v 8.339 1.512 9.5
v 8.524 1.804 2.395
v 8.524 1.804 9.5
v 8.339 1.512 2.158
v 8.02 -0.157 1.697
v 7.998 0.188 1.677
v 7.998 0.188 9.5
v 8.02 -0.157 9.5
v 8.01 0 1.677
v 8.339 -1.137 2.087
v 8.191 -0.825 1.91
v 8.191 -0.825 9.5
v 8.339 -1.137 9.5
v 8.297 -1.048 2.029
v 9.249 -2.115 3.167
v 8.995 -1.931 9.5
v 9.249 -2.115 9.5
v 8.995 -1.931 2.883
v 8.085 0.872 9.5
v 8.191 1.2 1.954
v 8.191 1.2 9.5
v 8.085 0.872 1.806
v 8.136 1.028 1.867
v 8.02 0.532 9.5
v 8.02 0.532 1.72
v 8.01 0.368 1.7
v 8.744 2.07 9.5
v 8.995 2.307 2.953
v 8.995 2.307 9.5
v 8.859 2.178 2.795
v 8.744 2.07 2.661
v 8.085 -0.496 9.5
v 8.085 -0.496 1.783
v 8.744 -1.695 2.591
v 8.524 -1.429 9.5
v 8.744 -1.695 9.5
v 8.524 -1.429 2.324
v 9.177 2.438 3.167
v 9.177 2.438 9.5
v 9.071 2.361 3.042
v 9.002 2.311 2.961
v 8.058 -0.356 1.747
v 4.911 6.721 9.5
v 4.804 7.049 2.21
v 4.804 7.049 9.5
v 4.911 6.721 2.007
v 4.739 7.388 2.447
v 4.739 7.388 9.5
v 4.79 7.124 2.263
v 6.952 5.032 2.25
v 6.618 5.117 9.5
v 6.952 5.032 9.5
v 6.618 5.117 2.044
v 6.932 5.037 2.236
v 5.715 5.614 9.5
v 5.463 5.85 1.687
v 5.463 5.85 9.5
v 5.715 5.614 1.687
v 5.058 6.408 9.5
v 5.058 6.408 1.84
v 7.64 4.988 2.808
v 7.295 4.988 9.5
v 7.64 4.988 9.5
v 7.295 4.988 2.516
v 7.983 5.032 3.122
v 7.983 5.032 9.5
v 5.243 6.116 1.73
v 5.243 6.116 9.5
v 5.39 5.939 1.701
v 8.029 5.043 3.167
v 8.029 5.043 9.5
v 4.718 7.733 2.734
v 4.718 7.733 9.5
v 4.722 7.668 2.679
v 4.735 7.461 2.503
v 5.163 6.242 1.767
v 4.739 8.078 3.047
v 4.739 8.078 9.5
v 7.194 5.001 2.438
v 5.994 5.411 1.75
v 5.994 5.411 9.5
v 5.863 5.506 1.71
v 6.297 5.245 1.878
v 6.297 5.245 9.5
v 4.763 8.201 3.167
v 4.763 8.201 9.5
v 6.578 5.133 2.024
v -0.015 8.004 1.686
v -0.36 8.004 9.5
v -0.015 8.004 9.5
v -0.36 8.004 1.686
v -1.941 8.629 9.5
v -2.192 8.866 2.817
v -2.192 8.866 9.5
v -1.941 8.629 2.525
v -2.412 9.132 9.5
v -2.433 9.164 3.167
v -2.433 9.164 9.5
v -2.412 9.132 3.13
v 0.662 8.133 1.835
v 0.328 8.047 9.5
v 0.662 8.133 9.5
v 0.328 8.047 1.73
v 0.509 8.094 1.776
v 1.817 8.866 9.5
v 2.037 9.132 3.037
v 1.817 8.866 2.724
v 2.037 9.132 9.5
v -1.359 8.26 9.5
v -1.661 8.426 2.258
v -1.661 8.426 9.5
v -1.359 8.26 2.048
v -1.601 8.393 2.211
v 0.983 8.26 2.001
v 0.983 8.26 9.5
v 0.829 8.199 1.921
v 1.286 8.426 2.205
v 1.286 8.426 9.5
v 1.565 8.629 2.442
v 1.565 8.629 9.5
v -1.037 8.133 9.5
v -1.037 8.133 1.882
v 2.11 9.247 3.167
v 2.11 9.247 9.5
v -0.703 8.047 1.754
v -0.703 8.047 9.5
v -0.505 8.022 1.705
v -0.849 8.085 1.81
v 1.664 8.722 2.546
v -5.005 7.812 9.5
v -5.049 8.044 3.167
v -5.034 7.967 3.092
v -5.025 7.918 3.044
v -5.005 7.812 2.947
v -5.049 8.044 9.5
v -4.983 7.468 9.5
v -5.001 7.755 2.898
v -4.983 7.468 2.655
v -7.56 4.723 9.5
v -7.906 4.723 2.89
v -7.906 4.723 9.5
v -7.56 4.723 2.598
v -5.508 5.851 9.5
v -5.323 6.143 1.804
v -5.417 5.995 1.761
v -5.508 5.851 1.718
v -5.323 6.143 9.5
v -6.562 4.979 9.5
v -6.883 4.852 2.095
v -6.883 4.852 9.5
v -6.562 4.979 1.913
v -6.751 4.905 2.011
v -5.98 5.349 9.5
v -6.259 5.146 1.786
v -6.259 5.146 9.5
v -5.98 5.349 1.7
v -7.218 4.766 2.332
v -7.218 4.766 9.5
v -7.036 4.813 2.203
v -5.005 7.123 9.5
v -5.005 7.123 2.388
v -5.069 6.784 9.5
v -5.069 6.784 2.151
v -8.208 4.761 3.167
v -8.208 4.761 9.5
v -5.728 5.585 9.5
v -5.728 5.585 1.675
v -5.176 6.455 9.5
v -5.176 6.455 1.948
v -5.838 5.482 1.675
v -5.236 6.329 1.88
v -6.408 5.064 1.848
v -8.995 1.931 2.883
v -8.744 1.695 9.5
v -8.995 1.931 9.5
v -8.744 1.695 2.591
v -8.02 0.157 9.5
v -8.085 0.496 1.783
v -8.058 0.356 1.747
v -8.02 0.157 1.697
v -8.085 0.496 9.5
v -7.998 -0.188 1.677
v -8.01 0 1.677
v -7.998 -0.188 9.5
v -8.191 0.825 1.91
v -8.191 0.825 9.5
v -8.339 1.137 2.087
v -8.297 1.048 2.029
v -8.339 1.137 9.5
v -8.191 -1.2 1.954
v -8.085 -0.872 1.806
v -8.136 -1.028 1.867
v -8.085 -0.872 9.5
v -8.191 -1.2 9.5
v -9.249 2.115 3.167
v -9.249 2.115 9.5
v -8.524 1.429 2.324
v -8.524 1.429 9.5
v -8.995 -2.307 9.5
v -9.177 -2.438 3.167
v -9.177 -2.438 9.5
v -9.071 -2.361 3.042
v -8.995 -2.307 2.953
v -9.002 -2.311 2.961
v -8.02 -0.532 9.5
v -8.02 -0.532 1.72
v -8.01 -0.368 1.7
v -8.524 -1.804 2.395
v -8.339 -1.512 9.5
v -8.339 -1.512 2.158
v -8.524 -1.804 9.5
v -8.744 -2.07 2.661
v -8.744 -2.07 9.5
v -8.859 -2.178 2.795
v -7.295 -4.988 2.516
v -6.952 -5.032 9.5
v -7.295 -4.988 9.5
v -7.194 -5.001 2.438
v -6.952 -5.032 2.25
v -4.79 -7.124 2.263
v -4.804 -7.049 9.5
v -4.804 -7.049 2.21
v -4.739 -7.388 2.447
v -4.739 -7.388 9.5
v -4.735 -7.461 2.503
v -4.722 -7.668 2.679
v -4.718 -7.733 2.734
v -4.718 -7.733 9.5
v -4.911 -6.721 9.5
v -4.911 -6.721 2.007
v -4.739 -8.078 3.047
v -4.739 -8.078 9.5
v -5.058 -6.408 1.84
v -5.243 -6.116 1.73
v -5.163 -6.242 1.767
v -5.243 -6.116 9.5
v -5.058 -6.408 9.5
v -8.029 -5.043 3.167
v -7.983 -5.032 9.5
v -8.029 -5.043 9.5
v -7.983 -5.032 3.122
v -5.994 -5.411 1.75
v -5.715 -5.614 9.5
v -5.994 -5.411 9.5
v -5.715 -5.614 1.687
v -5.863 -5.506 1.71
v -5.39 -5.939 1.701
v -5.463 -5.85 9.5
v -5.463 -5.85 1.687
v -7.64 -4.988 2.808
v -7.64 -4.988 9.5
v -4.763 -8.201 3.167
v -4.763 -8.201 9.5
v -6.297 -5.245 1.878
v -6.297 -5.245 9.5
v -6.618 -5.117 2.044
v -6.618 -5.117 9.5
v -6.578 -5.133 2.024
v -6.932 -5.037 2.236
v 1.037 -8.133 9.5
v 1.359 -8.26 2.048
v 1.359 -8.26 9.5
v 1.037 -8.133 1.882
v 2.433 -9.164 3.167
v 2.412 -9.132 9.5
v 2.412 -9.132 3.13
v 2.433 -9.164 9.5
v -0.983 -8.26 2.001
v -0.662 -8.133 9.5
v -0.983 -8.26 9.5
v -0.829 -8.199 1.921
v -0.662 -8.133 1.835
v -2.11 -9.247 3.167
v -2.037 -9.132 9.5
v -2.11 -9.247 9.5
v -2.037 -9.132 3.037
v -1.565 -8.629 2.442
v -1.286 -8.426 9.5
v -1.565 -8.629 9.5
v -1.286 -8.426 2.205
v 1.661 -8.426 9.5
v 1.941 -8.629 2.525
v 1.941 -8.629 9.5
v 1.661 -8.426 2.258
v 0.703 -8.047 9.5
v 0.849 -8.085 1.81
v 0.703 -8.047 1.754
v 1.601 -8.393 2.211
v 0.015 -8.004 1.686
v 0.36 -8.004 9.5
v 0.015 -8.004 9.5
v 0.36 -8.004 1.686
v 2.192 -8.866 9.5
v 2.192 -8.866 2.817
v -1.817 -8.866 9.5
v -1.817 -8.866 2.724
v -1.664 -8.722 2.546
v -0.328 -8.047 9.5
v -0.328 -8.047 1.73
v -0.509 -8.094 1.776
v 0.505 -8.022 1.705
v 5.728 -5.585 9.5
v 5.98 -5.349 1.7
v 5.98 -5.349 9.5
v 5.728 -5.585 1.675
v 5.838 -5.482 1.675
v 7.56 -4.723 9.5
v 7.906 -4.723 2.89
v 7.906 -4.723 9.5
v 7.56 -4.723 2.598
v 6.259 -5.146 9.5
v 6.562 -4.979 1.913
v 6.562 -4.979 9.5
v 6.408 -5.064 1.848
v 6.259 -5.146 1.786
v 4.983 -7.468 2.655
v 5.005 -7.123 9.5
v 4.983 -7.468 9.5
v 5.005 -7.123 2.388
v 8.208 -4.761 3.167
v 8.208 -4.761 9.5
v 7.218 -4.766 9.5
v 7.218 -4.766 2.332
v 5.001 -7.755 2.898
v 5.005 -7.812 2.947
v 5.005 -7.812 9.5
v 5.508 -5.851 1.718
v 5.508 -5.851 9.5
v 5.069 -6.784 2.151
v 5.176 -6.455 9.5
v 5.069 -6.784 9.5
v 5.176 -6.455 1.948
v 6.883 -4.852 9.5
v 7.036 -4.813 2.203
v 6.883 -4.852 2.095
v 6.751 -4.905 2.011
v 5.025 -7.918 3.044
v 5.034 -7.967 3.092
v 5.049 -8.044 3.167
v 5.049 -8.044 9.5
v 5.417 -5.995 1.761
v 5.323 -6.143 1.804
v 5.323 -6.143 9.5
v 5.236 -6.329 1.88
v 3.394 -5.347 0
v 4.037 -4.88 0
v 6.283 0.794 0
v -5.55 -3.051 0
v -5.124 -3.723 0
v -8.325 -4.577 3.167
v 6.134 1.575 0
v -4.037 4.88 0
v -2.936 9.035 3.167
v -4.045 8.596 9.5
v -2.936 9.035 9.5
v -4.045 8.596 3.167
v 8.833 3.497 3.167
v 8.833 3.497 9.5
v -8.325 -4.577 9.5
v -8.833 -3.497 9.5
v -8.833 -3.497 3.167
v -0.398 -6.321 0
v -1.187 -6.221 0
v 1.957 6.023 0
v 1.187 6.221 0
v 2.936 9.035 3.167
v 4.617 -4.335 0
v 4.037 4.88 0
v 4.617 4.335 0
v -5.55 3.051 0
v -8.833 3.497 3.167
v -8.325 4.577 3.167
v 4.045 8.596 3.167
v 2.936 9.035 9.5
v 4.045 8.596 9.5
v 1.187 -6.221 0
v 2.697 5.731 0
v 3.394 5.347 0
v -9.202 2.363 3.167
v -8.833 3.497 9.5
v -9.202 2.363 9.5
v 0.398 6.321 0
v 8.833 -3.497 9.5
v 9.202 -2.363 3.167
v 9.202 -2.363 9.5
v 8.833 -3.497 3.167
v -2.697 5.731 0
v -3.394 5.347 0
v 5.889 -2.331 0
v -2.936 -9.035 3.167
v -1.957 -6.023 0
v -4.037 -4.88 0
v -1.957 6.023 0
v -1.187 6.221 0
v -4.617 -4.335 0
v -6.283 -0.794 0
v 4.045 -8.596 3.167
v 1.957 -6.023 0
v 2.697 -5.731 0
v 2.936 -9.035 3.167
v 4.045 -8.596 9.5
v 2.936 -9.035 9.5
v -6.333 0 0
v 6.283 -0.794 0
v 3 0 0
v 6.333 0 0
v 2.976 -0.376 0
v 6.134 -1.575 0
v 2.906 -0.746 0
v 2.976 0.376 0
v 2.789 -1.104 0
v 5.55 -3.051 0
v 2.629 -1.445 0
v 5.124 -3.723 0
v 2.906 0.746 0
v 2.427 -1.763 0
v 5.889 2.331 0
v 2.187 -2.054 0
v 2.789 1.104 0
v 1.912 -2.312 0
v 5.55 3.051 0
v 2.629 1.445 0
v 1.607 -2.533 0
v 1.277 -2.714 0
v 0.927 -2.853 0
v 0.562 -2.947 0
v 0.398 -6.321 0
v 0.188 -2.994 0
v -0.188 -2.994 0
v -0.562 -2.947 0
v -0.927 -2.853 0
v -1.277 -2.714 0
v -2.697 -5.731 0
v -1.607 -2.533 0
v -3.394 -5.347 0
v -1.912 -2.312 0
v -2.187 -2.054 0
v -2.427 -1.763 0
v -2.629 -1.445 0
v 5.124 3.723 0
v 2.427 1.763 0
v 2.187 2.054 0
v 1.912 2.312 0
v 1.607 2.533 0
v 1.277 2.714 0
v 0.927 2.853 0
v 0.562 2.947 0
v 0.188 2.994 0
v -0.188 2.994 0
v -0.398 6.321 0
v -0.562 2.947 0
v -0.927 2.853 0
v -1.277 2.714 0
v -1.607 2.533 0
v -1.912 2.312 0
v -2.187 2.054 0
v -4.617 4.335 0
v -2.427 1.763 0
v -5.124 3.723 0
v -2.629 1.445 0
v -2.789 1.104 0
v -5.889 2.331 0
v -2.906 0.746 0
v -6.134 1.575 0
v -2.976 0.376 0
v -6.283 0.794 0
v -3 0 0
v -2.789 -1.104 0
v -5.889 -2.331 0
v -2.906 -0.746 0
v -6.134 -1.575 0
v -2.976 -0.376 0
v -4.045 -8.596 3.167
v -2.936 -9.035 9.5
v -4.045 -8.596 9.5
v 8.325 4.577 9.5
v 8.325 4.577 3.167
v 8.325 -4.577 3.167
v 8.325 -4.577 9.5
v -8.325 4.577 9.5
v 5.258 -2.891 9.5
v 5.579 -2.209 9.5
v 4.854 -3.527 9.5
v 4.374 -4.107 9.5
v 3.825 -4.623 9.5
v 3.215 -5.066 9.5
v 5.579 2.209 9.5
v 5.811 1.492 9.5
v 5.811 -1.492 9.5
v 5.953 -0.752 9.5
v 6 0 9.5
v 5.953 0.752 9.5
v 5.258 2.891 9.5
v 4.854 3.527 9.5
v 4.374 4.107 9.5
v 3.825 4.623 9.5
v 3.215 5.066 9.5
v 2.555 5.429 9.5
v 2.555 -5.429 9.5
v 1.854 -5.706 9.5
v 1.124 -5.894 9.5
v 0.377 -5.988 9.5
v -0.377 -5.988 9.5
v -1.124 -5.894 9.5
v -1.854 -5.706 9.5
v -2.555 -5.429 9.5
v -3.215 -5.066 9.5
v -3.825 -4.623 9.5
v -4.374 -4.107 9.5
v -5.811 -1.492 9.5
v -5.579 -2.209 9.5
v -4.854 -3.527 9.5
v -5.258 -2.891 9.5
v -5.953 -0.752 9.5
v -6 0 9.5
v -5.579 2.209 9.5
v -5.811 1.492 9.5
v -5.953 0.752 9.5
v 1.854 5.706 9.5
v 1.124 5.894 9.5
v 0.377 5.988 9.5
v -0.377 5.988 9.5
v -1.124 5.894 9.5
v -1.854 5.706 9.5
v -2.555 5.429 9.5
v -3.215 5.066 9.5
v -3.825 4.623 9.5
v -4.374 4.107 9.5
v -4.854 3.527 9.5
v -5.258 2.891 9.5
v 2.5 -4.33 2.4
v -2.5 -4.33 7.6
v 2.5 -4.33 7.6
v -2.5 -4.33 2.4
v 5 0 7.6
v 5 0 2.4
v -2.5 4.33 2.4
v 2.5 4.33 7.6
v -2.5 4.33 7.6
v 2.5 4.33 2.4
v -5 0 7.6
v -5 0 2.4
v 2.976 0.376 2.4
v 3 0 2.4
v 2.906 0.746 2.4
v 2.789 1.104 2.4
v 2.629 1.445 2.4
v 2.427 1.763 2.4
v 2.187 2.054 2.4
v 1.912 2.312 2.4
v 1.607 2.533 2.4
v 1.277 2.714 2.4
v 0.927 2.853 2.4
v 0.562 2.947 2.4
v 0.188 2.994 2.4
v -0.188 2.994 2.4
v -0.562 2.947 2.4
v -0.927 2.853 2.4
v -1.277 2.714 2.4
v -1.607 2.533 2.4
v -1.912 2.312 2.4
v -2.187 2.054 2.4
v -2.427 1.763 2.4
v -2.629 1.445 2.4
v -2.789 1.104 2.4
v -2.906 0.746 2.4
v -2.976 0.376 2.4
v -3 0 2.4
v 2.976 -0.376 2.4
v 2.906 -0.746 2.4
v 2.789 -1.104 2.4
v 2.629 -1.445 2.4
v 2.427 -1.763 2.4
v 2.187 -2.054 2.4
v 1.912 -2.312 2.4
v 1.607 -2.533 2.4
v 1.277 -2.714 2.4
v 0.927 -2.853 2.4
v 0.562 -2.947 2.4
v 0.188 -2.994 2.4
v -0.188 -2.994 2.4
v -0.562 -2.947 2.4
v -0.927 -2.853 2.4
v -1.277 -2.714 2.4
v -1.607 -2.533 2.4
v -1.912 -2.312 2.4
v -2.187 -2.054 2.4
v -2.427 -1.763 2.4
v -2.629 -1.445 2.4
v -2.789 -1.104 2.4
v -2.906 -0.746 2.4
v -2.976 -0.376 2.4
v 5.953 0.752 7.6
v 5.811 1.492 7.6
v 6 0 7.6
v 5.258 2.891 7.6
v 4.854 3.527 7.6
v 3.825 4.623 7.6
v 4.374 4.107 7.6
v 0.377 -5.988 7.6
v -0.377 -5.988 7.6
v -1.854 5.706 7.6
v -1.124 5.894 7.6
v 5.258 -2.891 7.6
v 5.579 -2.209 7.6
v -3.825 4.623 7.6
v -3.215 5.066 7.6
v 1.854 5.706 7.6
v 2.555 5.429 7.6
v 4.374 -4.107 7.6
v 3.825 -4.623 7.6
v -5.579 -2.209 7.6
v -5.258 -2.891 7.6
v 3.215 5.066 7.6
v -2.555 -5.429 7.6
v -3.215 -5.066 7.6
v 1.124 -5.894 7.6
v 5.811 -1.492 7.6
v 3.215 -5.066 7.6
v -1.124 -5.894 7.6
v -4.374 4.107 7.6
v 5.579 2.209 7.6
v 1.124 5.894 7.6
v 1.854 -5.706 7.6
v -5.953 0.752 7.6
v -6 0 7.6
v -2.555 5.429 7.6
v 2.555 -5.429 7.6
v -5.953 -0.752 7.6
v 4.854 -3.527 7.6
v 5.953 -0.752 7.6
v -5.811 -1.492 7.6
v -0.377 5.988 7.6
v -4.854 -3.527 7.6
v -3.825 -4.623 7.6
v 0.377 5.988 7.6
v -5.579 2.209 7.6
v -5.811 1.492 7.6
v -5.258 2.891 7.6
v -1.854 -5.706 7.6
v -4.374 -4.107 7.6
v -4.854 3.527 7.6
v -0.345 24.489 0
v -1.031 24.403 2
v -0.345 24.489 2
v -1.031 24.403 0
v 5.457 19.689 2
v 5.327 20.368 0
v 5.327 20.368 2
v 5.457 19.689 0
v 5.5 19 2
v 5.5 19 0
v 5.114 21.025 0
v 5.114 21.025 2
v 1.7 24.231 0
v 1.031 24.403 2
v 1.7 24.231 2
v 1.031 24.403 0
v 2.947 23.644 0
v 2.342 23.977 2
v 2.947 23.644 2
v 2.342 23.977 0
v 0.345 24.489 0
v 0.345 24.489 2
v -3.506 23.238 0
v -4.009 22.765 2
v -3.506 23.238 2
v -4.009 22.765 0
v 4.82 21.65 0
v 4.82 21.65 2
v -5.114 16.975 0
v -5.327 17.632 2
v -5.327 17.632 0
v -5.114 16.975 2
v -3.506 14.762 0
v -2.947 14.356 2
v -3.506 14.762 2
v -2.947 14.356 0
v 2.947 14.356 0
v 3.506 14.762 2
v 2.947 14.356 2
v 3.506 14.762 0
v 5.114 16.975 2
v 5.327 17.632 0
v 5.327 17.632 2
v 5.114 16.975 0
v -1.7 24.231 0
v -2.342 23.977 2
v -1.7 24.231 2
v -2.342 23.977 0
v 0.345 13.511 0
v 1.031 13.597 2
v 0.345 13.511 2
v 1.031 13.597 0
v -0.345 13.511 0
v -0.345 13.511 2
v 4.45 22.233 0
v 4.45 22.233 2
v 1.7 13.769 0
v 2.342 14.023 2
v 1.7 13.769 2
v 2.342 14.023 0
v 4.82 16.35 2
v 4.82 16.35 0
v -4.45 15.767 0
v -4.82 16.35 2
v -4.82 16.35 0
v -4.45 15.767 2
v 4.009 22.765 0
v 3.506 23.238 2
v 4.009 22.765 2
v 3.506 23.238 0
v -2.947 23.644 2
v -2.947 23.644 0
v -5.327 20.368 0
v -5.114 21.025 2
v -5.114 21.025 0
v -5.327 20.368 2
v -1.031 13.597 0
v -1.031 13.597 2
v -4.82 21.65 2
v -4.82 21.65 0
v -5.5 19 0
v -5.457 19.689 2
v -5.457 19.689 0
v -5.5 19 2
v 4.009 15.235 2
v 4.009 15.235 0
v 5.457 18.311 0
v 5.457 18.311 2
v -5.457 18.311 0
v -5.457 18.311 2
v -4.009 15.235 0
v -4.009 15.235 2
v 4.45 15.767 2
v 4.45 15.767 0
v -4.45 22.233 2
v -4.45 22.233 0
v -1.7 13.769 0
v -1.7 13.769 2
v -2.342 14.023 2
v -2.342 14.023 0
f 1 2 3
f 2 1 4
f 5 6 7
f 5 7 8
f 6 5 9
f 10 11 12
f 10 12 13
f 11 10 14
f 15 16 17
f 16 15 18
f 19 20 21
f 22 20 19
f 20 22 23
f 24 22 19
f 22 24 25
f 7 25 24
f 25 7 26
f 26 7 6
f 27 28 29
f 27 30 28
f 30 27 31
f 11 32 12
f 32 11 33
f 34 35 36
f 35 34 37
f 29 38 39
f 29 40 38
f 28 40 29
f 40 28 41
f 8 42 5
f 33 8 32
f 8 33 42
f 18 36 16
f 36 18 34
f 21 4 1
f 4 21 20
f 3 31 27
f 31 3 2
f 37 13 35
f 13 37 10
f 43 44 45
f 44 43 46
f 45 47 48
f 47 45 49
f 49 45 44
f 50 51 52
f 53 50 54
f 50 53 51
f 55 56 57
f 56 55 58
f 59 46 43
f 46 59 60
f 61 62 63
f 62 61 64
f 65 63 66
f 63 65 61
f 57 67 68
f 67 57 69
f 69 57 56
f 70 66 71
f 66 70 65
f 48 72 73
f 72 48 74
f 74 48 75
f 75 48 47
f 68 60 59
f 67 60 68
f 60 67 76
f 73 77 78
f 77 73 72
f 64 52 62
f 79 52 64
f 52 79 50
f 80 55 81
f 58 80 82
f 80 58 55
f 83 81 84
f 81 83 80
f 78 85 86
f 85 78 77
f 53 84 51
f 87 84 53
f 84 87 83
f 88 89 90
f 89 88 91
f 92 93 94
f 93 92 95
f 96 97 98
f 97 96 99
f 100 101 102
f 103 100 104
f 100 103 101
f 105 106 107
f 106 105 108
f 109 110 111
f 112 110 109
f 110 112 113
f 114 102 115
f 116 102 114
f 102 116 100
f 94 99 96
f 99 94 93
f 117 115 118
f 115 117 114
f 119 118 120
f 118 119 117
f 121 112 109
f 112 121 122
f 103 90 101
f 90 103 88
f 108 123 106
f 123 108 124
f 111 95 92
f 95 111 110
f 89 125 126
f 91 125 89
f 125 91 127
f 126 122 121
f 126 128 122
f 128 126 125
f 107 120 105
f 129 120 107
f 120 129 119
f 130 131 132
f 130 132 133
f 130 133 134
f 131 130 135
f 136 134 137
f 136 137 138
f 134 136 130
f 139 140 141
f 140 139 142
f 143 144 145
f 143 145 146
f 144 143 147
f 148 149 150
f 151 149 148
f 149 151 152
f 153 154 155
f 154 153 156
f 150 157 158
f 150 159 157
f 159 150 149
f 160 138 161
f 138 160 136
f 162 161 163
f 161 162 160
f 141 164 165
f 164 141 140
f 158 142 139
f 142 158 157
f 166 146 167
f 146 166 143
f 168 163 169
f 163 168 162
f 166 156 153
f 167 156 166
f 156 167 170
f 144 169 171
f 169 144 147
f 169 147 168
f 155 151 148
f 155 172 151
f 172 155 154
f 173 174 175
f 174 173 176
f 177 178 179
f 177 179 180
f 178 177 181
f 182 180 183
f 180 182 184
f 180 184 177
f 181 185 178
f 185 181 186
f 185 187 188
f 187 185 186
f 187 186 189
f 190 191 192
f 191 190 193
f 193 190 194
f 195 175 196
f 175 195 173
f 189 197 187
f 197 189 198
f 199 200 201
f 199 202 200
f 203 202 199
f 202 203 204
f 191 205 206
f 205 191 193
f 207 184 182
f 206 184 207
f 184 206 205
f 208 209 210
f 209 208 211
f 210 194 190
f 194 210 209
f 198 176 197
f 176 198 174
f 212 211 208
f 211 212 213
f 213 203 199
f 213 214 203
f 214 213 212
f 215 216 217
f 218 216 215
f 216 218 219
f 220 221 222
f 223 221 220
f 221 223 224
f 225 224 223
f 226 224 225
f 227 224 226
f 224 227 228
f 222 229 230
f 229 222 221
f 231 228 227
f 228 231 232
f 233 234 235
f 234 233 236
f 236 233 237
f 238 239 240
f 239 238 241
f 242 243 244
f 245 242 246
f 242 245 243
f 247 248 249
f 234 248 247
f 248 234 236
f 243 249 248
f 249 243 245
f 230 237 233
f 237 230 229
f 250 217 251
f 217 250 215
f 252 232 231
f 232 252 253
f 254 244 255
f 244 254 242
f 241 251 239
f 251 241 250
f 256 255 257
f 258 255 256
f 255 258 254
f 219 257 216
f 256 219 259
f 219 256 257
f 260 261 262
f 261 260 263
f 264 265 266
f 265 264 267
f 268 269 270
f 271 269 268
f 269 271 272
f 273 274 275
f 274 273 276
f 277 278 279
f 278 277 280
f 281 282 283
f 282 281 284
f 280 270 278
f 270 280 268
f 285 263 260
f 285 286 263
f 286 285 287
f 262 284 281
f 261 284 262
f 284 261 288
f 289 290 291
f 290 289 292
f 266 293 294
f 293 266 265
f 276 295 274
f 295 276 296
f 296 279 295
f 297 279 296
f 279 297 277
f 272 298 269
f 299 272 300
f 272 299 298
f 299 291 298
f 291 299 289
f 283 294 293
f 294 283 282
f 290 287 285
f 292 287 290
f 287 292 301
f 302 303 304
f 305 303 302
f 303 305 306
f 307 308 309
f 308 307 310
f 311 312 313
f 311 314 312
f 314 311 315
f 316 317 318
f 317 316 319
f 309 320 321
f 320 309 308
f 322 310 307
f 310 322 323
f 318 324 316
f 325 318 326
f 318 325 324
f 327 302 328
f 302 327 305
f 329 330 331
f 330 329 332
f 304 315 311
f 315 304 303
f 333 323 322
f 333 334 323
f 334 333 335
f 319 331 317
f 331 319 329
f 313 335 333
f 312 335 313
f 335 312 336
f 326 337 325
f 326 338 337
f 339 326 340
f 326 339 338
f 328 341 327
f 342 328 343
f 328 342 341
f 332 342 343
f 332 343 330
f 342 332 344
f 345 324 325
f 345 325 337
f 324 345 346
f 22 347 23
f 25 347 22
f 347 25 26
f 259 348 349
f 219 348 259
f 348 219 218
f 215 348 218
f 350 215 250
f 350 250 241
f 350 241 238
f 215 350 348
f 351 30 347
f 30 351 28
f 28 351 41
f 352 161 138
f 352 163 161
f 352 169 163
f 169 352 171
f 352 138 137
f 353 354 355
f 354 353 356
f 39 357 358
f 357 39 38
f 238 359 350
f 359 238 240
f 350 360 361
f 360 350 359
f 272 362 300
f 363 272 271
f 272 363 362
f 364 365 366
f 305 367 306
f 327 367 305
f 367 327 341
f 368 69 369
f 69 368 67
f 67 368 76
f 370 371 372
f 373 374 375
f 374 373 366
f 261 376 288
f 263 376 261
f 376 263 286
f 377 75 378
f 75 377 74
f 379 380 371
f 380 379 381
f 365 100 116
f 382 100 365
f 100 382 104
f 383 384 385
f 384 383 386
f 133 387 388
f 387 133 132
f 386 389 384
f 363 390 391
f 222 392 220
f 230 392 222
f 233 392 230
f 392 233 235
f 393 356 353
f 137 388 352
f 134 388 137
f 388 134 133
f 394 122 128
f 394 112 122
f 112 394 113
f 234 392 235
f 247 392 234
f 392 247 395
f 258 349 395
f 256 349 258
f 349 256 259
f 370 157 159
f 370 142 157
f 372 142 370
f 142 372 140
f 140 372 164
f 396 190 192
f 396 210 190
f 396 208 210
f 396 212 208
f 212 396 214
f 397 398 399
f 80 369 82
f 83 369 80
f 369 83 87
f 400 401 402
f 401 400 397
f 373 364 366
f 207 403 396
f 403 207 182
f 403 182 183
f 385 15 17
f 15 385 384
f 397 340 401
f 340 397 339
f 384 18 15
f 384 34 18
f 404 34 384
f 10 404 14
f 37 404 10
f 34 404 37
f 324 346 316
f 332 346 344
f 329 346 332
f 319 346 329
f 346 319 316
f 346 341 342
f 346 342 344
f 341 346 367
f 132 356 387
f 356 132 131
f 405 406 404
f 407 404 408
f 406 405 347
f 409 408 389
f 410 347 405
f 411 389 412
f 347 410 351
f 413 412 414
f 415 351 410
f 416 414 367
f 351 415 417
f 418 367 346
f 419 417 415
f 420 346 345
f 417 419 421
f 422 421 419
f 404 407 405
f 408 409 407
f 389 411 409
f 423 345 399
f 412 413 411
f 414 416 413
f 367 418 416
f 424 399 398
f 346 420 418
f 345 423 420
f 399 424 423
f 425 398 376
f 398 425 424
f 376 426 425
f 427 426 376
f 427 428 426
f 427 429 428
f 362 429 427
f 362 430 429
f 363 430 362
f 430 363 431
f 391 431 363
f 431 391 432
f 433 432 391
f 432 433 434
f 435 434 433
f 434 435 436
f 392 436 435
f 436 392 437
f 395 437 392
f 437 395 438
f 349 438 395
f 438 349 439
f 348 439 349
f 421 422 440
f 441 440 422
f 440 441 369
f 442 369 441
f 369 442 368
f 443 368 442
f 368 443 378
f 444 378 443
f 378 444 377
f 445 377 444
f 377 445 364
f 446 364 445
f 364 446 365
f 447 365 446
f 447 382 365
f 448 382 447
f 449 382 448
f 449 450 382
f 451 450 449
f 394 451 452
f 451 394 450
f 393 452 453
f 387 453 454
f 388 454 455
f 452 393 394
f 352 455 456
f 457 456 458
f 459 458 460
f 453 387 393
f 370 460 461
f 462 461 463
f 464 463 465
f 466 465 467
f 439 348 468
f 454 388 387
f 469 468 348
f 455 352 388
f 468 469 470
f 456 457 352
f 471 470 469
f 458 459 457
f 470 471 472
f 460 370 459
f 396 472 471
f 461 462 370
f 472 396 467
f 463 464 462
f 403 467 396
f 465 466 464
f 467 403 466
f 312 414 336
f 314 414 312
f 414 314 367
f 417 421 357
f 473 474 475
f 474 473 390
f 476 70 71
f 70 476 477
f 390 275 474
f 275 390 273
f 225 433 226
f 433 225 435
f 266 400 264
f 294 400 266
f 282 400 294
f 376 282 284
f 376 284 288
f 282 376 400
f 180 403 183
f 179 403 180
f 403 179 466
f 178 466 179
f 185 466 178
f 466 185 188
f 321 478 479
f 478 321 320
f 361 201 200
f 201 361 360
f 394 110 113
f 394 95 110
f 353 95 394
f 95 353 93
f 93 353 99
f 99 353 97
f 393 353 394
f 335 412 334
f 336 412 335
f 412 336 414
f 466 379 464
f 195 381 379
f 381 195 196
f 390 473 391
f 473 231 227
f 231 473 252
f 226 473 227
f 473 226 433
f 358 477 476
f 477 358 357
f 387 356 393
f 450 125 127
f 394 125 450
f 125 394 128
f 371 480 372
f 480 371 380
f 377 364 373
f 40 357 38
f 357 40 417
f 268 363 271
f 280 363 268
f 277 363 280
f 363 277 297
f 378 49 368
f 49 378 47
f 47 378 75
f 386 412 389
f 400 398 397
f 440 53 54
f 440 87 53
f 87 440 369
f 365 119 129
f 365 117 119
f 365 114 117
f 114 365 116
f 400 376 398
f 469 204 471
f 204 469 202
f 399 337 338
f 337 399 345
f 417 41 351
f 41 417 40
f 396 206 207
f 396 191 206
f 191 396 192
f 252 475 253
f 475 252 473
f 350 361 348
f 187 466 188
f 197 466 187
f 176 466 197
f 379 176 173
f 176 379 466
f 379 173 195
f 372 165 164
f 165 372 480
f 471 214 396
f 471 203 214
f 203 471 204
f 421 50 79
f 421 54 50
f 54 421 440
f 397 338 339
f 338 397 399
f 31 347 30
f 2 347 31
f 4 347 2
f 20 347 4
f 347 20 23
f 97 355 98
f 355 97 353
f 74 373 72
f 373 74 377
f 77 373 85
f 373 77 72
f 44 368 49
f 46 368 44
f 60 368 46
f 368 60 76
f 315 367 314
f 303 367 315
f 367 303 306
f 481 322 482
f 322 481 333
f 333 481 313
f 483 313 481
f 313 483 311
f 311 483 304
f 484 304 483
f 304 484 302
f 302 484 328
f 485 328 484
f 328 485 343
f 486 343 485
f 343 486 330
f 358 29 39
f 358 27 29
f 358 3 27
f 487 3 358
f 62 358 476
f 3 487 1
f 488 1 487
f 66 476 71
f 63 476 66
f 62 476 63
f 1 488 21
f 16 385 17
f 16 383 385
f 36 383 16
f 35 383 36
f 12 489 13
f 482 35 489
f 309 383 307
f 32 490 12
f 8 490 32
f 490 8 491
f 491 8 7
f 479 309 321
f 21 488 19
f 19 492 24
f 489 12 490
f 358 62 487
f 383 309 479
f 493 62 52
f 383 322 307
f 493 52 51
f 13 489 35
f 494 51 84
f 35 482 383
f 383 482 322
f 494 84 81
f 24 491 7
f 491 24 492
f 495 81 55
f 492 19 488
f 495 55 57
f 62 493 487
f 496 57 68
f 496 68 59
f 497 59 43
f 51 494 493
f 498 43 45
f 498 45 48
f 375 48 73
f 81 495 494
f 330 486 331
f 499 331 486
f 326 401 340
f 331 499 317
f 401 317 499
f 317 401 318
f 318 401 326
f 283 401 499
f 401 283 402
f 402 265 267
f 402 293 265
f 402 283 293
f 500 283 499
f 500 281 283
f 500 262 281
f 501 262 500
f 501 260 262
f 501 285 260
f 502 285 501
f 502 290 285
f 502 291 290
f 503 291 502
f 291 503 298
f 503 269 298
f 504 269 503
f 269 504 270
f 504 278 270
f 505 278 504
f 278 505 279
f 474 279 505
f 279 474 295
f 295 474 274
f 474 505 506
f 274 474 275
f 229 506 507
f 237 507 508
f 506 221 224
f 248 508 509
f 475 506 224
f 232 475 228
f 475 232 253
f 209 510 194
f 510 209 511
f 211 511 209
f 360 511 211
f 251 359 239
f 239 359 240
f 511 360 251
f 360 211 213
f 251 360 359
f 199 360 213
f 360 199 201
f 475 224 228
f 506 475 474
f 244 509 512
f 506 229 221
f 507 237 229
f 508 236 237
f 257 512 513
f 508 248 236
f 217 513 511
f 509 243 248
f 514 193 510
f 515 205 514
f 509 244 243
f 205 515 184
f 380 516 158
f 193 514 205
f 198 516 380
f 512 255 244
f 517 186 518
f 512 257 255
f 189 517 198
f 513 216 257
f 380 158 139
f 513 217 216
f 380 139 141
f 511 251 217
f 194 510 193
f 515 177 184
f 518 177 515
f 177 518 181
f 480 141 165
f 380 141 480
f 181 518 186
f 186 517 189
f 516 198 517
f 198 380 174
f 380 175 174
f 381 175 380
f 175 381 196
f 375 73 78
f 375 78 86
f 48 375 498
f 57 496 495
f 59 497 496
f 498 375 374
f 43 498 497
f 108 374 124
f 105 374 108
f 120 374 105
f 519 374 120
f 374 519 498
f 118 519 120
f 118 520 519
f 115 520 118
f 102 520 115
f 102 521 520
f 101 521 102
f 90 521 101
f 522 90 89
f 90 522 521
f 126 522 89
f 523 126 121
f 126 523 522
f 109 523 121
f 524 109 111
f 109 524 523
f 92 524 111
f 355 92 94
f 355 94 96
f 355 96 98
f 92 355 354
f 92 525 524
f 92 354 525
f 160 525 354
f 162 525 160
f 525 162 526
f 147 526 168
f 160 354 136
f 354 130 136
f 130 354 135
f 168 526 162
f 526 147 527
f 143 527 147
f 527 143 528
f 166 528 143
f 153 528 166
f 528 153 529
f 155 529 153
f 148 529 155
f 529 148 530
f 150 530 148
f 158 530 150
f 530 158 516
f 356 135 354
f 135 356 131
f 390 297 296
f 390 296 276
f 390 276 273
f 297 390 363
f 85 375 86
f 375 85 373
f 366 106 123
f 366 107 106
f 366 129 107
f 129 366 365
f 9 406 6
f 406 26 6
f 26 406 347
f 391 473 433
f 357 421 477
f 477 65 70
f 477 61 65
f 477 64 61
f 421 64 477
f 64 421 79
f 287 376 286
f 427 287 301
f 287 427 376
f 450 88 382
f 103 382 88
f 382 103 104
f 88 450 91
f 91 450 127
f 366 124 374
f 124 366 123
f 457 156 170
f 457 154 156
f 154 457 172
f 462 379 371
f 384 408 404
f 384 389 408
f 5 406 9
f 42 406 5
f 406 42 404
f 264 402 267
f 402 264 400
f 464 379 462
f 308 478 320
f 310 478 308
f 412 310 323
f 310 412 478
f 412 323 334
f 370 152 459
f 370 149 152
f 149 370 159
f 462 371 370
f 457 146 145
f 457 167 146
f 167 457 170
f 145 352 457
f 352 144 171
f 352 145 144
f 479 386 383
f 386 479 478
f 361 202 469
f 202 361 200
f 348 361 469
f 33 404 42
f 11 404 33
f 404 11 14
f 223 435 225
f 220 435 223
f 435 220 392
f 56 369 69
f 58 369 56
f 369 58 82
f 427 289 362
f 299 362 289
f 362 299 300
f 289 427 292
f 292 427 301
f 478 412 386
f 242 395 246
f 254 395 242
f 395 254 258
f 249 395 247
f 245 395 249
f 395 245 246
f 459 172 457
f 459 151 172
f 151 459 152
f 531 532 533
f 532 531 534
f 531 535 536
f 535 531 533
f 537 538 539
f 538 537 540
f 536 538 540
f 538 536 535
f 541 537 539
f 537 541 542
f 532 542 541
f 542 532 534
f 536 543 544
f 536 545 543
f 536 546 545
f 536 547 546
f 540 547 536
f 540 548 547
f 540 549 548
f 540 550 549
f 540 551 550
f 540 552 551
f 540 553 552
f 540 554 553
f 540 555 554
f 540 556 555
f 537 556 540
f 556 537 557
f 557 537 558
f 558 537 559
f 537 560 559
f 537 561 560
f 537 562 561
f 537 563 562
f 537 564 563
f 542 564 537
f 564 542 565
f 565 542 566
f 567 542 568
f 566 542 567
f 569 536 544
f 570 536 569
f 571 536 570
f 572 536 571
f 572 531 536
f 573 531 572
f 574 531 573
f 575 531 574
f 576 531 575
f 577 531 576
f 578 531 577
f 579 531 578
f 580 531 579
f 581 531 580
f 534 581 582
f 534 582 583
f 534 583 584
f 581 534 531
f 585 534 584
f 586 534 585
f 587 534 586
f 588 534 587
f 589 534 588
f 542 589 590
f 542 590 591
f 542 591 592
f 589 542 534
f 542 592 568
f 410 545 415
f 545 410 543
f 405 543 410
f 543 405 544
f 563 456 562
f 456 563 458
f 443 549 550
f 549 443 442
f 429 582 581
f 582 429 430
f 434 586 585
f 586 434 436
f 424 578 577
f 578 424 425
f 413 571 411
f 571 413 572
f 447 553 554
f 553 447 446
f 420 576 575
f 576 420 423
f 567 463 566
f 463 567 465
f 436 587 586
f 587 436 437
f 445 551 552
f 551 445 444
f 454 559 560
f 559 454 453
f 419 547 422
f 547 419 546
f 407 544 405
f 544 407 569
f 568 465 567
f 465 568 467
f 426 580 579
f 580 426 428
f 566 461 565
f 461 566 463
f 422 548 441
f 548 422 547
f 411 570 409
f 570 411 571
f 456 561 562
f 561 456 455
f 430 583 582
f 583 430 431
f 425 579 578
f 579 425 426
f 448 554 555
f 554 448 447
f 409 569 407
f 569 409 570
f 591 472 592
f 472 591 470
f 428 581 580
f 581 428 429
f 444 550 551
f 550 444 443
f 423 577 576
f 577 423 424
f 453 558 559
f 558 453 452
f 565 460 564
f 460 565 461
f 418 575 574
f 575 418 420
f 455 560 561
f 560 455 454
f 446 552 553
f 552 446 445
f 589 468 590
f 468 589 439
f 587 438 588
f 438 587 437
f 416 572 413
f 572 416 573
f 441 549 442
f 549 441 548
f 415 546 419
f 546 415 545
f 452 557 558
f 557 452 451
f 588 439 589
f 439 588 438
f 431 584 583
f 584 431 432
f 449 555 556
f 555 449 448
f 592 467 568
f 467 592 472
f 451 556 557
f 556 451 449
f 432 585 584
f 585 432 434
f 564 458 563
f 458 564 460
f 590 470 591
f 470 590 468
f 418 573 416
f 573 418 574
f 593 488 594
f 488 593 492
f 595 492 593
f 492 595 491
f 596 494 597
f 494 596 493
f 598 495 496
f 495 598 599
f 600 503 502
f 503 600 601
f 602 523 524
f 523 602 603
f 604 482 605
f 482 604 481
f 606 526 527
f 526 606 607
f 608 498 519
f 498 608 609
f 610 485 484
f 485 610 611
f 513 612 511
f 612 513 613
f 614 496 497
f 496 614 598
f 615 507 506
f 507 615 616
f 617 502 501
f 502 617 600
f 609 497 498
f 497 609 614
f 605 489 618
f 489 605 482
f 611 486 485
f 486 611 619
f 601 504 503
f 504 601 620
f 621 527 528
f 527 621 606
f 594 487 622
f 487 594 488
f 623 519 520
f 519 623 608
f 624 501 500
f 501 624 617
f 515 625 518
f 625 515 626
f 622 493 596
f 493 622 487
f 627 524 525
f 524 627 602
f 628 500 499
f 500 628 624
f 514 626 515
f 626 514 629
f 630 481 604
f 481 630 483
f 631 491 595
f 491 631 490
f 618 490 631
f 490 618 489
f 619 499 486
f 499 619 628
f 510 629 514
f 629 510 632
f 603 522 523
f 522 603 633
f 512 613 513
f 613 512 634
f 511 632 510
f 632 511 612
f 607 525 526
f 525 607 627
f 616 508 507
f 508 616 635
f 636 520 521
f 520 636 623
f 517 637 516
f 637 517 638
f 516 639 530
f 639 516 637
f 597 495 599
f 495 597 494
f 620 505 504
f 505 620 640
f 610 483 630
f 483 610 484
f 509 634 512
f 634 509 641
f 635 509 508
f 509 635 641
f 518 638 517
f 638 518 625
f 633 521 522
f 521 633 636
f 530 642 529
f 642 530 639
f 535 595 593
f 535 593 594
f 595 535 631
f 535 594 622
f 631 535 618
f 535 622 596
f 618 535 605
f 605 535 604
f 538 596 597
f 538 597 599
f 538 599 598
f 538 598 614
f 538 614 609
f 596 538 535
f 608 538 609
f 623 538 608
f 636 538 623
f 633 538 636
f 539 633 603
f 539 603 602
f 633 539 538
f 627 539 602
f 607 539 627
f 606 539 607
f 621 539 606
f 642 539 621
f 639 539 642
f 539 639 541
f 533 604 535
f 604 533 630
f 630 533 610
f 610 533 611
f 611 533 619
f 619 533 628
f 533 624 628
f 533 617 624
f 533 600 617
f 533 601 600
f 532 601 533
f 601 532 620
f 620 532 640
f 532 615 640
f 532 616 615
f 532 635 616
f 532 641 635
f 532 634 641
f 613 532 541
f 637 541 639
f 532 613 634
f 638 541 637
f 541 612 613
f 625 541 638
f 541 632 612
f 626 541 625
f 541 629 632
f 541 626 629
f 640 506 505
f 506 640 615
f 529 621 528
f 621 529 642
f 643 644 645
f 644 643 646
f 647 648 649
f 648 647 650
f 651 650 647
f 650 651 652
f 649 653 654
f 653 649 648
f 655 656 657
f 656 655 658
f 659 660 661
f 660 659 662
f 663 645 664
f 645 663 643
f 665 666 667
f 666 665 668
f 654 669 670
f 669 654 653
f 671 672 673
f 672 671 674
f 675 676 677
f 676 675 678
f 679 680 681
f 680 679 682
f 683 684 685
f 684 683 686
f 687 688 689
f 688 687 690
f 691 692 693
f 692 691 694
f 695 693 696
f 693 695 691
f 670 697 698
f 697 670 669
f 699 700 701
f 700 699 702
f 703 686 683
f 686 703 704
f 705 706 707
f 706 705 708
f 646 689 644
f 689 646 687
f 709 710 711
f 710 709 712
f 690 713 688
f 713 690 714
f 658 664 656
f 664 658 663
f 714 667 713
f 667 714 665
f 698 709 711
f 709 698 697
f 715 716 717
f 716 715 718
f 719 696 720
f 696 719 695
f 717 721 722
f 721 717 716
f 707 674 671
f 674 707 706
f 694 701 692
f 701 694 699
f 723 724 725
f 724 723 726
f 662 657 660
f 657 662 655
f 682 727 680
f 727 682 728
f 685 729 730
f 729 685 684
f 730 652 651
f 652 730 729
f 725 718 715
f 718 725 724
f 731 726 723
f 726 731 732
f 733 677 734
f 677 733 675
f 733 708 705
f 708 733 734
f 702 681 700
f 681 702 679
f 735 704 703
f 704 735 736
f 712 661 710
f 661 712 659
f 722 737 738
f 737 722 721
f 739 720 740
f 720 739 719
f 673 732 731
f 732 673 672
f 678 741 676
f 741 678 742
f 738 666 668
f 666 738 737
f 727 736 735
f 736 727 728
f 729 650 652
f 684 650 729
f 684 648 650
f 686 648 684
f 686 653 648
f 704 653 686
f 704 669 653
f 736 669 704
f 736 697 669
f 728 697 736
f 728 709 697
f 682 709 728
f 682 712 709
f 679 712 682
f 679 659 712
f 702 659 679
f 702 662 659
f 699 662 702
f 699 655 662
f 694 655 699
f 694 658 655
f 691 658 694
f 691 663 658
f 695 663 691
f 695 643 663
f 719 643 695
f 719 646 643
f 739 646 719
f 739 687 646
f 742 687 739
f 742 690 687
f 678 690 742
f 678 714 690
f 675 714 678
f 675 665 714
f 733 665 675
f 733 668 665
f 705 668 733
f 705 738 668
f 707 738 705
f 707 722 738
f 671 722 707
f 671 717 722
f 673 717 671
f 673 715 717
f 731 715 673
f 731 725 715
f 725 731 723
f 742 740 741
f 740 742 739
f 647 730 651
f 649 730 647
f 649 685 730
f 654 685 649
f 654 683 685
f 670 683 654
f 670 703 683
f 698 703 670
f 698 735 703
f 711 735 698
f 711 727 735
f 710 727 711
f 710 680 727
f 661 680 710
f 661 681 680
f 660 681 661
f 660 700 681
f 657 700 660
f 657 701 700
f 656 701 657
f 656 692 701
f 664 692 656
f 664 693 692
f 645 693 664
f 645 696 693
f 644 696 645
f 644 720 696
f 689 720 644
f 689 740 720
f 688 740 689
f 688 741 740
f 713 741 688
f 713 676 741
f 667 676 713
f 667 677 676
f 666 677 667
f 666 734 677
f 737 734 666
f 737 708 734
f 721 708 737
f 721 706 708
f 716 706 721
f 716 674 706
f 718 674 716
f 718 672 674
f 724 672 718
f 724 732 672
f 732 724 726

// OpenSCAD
// inspired by http://www.thingiverse.com/thing:11405

module m6_knob(r, h, $fn=50) {

    o=.1;

    m6_thick = 5.2;

    module plug(r=6, h=2) {
        cylinder(r=r, h=h);
    }

    module knob() {
        difference() {
            hull() {
                cylinder(r=r * 2/3, h=h);
                translate([0,0,h/3]) cylinder(r=r, h=h * 2/3);
            }
            // hex nut hole
            translate([0,0,h - 2 - m6_thick+o]) cylinder(r=5,h=m6_thick+o,$fn=6);
            // pivot screw hole
            translate([0,0,-o]) cylinder(r=3, h=h+2*o);
            // Plug
            translate([0,0,h-2+o]) plug(h=2+o);
            // Grippy bits
            for (angle = [1 : 45 : 359]) {
                assign (radius = r + 1.25)
                    assign (x = radius * cos(angle), y = radius * sin(angle))
                        translate([x, y, 0]) cylinder(r=2.75, h=20);
            }
        }
    }

    knob();
    translate([0,r*2,0]) plug(r=5.5);
}

m6_knob(19/2, 19/2);
